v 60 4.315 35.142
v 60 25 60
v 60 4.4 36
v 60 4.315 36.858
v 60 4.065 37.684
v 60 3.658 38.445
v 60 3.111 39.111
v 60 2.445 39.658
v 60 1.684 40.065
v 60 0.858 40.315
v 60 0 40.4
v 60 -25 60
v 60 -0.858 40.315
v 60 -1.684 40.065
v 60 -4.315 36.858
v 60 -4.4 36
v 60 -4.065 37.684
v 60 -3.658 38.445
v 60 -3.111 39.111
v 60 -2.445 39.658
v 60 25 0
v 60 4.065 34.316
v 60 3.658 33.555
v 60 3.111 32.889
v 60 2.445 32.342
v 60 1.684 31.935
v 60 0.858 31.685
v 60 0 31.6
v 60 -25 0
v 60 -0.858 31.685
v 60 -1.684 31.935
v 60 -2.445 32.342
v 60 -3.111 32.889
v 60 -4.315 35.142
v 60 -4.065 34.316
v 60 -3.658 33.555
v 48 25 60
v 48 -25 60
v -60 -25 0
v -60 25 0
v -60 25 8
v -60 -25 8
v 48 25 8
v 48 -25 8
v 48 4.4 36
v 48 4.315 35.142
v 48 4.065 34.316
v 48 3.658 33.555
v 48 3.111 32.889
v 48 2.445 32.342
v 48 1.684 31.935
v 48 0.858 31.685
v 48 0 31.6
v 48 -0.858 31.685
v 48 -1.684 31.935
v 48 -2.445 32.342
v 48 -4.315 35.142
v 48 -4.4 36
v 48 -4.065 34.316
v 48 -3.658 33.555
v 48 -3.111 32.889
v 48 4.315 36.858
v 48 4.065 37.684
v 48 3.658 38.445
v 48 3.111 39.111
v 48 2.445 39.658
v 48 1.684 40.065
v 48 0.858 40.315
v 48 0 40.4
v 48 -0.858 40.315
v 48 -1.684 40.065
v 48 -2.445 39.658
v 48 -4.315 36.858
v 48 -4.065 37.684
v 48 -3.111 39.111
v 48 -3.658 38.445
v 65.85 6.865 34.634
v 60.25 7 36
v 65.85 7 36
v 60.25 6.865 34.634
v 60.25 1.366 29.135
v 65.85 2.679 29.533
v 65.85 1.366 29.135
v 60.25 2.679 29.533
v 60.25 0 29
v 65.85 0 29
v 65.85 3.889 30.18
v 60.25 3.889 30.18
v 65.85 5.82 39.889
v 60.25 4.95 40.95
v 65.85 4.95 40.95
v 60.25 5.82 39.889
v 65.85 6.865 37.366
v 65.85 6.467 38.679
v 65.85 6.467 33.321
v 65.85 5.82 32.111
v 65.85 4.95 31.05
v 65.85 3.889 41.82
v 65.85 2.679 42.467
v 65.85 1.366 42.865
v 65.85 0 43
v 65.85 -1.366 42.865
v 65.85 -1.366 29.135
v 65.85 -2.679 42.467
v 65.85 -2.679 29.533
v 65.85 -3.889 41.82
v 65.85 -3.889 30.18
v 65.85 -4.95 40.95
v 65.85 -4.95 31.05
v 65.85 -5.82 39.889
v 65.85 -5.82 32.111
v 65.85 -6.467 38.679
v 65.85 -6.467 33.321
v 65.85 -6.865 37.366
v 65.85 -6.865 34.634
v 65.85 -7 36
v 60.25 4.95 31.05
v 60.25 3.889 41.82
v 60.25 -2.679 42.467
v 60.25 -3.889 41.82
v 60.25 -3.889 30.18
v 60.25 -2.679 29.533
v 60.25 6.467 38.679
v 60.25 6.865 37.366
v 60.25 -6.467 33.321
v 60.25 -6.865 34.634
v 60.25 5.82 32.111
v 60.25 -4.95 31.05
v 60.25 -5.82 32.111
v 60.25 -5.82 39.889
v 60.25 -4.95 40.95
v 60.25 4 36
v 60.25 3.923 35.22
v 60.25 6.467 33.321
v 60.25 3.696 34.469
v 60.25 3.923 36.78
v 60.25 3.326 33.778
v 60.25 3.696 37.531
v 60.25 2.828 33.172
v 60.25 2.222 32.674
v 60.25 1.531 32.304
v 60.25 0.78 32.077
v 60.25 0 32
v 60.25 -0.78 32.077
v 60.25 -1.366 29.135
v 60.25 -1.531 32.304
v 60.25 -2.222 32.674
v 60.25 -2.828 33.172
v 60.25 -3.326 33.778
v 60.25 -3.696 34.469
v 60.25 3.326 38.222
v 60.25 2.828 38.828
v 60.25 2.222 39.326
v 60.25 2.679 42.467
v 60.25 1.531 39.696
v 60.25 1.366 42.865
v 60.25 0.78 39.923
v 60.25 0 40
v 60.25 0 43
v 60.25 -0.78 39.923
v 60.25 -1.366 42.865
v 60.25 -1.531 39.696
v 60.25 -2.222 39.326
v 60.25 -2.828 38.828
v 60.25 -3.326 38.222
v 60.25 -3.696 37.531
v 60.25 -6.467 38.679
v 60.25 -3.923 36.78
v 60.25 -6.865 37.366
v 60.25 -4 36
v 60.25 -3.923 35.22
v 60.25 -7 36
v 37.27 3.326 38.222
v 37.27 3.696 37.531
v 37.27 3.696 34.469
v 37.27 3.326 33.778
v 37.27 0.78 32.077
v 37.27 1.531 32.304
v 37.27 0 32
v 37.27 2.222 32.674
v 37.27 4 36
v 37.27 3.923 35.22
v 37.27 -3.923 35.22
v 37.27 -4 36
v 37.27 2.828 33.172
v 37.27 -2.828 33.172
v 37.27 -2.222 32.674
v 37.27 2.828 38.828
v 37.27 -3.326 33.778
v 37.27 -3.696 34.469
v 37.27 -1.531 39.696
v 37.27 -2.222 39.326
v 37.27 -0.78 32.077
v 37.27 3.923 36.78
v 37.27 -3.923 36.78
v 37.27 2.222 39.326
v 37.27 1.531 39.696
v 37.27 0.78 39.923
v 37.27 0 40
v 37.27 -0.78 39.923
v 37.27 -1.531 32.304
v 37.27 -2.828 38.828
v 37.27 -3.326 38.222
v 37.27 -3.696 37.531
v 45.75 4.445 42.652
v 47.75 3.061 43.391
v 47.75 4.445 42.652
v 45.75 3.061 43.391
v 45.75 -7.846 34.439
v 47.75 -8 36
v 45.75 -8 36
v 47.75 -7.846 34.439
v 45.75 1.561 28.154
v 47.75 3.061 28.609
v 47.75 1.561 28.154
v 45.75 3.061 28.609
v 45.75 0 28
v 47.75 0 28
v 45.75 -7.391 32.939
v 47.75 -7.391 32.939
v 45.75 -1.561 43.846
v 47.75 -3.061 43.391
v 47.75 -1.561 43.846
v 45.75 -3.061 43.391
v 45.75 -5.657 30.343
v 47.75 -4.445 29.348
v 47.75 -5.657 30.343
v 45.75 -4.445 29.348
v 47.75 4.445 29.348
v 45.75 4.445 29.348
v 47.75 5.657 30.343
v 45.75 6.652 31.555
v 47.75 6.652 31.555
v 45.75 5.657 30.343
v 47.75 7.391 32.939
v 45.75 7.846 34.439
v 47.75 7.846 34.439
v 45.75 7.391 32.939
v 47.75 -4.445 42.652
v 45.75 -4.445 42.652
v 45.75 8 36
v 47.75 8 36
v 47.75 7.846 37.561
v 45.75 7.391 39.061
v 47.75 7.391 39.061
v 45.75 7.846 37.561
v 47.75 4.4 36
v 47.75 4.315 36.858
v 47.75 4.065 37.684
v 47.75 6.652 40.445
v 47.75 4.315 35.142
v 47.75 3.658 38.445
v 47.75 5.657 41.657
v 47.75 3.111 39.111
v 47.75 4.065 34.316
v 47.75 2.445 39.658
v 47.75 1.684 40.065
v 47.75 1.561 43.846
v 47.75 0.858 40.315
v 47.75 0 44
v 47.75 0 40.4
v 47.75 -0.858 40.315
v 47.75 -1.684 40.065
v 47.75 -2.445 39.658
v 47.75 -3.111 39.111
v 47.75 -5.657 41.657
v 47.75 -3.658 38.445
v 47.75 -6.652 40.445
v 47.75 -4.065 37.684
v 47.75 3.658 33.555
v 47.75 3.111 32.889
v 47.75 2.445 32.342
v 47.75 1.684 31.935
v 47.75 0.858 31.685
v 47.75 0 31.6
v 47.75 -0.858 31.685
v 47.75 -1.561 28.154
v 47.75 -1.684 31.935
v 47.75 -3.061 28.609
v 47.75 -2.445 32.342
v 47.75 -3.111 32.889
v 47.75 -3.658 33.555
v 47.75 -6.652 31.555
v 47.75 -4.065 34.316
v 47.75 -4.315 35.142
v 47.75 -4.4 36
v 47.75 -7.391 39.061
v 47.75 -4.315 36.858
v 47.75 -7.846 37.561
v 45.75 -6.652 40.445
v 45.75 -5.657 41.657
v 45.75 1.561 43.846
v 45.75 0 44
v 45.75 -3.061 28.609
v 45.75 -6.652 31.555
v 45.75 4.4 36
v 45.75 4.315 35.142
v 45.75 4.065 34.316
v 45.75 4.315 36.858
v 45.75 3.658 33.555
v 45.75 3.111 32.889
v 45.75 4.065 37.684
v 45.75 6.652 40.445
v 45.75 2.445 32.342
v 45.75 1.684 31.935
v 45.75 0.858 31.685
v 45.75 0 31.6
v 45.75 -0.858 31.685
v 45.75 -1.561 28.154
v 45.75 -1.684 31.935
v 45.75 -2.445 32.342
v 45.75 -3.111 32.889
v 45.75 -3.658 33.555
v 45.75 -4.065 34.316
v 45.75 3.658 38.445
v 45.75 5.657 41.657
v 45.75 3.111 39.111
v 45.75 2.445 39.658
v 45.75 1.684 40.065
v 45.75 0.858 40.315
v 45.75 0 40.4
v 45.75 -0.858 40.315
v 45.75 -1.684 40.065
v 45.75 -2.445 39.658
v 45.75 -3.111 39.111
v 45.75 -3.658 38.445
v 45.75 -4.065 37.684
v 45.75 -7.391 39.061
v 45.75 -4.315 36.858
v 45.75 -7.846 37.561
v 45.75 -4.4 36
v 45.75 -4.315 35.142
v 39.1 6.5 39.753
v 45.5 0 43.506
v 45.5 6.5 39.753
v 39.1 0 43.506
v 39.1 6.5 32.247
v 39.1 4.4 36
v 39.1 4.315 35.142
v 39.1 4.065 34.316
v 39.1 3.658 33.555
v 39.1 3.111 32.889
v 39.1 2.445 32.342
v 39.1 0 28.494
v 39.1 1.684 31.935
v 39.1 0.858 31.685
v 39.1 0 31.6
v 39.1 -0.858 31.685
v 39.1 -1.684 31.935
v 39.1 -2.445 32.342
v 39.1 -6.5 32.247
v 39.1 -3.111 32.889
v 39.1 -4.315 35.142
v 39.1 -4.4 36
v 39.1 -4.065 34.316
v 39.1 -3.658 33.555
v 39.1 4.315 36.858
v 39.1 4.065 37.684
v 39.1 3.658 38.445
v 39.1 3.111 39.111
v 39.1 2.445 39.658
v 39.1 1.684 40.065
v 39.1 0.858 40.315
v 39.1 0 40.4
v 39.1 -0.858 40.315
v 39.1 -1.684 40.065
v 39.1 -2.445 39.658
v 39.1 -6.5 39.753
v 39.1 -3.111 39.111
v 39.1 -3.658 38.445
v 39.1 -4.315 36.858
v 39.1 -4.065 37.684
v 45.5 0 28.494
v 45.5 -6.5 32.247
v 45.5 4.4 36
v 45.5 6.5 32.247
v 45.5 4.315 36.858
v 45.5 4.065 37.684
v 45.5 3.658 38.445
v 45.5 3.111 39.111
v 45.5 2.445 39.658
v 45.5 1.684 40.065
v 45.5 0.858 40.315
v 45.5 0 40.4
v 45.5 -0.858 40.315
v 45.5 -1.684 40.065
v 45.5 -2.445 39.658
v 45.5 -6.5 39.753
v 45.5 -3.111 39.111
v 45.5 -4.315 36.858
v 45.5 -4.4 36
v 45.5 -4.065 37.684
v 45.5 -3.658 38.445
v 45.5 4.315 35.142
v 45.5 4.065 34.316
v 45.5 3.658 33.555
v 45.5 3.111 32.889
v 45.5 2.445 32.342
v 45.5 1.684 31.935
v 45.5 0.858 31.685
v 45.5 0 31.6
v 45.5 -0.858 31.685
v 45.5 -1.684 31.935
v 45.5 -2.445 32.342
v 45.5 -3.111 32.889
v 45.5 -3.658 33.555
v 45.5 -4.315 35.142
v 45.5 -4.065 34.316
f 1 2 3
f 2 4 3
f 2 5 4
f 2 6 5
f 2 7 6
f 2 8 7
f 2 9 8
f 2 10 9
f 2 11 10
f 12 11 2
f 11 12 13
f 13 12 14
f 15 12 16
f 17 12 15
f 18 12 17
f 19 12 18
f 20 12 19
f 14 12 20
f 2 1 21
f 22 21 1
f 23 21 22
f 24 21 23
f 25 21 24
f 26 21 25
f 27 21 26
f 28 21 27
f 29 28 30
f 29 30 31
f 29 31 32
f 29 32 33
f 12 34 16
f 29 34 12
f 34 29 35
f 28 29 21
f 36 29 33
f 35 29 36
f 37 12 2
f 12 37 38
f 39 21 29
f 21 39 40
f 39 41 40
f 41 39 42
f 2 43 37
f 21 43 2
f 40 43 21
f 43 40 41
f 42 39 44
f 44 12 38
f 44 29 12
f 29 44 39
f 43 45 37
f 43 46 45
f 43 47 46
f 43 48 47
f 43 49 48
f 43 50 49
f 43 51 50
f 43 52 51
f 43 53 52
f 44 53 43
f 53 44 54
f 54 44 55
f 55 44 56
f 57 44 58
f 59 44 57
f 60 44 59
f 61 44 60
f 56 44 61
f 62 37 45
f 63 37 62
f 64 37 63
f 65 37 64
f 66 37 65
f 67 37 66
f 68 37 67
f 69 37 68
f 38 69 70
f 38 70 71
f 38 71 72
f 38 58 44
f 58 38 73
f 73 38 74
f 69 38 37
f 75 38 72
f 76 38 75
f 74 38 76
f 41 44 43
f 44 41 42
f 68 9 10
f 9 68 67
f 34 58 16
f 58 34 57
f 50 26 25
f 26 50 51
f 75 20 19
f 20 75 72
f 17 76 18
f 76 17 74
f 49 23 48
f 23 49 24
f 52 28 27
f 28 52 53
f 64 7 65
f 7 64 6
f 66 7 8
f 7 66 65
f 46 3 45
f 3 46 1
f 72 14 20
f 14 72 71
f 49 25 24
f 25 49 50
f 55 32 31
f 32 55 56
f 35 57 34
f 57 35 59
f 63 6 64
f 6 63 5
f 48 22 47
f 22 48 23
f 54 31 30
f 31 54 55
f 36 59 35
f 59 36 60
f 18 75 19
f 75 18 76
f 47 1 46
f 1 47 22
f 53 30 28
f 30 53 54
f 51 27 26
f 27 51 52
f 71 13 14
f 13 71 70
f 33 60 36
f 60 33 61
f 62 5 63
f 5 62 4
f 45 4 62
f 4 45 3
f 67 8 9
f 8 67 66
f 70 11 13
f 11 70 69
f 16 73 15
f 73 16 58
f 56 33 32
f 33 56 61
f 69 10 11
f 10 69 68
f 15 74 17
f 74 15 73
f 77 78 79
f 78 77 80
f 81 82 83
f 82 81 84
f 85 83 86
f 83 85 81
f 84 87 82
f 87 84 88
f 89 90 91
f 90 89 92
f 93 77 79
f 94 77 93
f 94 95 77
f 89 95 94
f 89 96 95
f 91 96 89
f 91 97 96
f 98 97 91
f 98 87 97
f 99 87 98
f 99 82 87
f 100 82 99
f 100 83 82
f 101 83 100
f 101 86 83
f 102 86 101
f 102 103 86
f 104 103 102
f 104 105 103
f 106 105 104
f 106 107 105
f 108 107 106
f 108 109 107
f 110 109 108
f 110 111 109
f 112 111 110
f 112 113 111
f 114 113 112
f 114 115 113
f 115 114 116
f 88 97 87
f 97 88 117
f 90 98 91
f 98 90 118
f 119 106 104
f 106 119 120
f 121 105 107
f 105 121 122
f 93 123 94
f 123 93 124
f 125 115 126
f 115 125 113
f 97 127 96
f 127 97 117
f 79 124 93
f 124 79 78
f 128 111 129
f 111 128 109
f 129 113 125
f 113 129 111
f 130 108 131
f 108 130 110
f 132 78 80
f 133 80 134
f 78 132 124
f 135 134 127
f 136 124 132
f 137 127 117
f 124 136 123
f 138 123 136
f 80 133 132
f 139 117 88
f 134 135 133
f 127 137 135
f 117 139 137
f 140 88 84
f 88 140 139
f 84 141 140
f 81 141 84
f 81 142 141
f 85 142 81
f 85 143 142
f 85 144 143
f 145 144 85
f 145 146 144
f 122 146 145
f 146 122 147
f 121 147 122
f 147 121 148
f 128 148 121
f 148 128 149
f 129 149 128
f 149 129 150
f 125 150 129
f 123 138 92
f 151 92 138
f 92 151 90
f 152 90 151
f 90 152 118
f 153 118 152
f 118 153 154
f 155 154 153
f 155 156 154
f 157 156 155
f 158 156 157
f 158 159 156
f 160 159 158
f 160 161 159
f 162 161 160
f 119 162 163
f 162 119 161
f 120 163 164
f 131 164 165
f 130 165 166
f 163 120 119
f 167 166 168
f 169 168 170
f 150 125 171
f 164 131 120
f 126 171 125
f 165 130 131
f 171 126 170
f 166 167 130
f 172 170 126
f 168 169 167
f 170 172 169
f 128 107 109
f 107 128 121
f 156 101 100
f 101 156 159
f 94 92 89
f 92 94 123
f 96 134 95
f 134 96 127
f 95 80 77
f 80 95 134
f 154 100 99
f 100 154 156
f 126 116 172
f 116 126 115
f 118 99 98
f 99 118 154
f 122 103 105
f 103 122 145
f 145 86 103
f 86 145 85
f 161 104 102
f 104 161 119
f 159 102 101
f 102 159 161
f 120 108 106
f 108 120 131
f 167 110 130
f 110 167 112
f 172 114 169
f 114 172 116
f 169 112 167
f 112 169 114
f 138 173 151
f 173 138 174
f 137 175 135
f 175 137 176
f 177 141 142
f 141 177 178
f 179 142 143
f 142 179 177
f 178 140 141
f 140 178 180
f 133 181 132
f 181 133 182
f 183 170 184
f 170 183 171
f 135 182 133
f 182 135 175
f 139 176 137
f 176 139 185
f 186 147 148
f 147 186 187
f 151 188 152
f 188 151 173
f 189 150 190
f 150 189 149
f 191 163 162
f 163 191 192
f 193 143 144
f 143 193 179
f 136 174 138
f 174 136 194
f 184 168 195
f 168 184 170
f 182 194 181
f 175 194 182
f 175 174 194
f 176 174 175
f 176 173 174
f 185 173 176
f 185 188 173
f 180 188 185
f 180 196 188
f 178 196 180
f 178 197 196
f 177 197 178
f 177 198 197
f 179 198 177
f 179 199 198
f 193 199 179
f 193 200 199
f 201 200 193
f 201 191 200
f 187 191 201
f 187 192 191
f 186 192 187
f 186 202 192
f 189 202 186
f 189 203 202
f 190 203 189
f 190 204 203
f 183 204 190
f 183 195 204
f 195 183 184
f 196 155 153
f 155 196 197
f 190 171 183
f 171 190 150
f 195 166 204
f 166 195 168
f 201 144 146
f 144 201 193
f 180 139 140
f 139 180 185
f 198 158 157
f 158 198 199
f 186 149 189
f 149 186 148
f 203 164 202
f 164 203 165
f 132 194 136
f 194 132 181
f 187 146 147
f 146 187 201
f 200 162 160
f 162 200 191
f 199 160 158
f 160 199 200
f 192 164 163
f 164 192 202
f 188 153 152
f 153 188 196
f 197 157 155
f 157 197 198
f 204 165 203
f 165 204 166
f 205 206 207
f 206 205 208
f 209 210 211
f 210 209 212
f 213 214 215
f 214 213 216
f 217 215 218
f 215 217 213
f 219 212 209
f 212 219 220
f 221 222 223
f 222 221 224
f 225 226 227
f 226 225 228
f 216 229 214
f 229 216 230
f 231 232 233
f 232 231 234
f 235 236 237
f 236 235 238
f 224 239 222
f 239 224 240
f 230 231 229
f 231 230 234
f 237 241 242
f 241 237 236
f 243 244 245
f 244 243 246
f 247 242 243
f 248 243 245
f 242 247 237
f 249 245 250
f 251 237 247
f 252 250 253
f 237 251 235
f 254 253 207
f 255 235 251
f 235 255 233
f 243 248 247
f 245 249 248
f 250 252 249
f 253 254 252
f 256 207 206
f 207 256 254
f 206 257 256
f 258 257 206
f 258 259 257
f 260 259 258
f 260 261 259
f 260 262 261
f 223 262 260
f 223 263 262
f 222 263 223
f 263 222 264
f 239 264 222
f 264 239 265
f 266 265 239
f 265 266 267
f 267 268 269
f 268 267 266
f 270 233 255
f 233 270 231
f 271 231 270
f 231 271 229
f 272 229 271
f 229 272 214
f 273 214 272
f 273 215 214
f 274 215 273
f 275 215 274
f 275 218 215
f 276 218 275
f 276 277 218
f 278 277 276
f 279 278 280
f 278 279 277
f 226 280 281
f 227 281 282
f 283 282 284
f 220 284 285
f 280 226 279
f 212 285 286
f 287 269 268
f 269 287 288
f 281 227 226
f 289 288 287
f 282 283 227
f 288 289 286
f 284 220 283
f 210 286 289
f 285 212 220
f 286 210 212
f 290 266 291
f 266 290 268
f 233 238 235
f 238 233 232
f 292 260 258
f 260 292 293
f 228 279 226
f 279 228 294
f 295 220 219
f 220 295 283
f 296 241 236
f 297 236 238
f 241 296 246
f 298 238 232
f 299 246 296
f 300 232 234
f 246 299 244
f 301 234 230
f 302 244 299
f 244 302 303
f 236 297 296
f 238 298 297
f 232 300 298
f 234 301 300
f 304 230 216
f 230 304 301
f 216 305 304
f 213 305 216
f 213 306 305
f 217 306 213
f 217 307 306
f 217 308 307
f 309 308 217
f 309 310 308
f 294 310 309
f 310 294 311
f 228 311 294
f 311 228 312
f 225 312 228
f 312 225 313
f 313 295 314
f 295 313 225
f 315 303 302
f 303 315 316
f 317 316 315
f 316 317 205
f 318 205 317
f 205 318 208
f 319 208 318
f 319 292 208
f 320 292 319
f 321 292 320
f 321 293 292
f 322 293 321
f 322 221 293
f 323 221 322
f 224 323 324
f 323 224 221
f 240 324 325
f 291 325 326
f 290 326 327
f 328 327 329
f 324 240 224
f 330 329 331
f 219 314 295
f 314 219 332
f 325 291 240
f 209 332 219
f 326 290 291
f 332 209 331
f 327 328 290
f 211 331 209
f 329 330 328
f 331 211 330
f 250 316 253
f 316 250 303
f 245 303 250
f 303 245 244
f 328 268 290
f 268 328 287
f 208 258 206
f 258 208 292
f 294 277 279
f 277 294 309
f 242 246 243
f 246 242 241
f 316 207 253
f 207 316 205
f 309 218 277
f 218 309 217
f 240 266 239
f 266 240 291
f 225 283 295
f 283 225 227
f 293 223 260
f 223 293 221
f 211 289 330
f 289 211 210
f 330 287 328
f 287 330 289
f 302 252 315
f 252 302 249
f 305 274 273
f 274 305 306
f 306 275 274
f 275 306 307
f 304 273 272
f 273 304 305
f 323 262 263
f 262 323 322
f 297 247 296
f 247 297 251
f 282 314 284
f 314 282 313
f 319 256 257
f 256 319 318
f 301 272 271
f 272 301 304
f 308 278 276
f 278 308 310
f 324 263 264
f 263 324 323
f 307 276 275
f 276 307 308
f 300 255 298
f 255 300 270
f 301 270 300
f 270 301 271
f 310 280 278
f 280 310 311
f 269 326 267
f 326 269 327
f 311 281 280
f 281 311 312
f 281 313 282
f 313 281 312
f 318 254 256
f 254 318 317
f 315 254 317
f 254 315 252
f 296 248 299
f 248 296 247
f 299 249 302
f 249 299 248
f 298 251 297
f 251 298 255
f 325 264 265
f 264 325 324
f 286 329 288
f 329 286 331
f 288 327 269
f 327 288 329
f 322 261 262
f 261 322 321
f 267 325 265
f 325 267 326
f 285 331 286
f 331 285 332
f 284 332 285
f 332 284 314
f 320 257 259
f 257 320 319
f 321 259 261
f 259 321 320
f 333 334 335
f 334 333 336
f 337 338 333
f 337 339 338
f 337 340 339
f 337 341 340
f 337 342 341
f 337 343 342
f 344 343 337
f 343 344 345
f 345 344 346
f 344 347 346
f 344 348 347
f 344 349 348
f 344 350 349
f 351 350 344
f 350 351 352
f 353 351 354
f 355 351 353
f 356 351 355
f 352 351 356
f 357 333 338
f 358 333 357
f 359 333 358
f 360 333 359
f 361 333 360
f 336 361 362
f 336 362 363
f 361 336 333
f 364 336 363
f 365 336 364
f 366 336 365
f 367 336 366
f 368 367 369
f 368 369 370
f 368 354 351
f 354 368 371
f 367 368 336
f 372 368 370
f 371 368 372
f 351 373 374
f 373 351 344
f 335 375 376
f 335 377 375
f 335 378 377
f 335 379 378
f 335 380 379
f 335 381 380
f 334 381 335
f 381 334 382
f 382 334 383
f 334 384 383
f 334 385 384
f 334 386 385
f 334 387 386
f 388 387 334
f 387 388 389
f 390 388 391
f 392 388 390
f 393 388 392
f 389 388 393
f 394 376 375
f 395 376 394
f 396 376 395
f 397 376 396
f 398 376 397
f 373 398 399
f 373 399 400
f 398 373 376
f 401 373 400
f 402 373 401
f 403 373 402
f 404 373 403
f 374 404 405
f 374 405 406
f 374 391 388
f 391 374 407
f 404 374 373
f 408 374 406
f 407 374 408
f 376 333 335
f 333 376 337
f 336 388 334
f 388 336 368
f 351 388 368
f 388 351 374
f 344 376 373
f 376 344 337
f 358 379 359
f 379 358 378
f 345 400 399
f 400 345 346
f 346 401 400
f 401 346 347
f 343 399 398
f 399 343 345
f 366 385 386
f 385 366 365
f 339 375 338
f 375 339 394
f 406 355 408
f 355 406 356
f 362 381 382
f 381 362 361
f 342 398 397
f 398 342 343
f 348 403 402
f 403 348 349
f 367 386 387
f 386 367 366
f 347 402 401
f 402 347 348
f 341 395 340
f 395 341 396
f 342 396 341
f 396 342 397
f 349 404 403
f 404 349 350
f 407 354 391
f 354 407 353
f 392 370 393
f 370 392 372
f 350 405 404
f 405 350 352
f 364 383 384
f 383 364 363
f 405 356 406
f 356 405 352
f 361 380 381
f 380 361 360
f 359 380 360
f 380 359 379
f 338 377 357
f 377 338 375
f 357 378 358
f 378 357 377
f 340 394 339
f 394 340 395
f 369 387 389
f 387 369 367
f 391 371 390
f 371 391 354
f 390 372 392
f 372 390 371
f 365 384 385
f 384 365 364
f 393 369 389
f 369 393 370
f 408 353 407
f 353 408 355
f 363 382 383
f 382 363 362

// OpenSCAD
$fn = 32;

// ------------------------------------------------------------------------
// Bolted bracket: 120 x 50 mm bracket with 1 bolt joints
// Every part is its own module, assembly() places them once.
// ------------------------------------------------------------------------

// --- part 1 ---
module bracket() {
  difference() {
    translate([-60, -25, 0]) cube([120, 50, 60]);
    translate([-61, -26, 8]) cube([109, 52, 53]);
    translate([54, 0, 36]) rotate([0, 90, 0]) cylinder(h = 14, d = 8.8, center = true);
  }
}

// --- part 2 ---
module bolt() {
  cylinder(h = 5.6, d = 14);
  translate([0, 0, -22.98]) cylinder(h = 22.98, d = 8);
}

// --- part 3 ---
module washer() {
  difference() {
      translate([0, 0, 0]) cylinder(h = 2, d = 16);
      translate([0, 0, -1]) cylinder(h = 4, d = 8.8);
    }
}

// --- part 4 ---
module nut() {
  difference() {
    linear_extrude(height = 6.4) polygon(points = [[7.506, 0], [3.753, 6.5], [-3.753, 6.5], [-7.506, 0], [-3.753, -6.5], [3.753, -6.5]]);
    translate([0, 0, -1]) cylinder(h = 8.4, d = 8.8);
  }
}

// --- assembly ---
module assembly() {
  translate([0, 0, 0]) rotate([0, 0, 0]) bracket();
  translate([60.25, 0, 36]) rotate([0, 90, 0]) bolt();
  translate([45.75, 0, 36]) rotate([0, 90, 0]) washer();
  translate([39.1, 0, 36]) rotate([0, 90, 0]) nut();
}

assembly();
